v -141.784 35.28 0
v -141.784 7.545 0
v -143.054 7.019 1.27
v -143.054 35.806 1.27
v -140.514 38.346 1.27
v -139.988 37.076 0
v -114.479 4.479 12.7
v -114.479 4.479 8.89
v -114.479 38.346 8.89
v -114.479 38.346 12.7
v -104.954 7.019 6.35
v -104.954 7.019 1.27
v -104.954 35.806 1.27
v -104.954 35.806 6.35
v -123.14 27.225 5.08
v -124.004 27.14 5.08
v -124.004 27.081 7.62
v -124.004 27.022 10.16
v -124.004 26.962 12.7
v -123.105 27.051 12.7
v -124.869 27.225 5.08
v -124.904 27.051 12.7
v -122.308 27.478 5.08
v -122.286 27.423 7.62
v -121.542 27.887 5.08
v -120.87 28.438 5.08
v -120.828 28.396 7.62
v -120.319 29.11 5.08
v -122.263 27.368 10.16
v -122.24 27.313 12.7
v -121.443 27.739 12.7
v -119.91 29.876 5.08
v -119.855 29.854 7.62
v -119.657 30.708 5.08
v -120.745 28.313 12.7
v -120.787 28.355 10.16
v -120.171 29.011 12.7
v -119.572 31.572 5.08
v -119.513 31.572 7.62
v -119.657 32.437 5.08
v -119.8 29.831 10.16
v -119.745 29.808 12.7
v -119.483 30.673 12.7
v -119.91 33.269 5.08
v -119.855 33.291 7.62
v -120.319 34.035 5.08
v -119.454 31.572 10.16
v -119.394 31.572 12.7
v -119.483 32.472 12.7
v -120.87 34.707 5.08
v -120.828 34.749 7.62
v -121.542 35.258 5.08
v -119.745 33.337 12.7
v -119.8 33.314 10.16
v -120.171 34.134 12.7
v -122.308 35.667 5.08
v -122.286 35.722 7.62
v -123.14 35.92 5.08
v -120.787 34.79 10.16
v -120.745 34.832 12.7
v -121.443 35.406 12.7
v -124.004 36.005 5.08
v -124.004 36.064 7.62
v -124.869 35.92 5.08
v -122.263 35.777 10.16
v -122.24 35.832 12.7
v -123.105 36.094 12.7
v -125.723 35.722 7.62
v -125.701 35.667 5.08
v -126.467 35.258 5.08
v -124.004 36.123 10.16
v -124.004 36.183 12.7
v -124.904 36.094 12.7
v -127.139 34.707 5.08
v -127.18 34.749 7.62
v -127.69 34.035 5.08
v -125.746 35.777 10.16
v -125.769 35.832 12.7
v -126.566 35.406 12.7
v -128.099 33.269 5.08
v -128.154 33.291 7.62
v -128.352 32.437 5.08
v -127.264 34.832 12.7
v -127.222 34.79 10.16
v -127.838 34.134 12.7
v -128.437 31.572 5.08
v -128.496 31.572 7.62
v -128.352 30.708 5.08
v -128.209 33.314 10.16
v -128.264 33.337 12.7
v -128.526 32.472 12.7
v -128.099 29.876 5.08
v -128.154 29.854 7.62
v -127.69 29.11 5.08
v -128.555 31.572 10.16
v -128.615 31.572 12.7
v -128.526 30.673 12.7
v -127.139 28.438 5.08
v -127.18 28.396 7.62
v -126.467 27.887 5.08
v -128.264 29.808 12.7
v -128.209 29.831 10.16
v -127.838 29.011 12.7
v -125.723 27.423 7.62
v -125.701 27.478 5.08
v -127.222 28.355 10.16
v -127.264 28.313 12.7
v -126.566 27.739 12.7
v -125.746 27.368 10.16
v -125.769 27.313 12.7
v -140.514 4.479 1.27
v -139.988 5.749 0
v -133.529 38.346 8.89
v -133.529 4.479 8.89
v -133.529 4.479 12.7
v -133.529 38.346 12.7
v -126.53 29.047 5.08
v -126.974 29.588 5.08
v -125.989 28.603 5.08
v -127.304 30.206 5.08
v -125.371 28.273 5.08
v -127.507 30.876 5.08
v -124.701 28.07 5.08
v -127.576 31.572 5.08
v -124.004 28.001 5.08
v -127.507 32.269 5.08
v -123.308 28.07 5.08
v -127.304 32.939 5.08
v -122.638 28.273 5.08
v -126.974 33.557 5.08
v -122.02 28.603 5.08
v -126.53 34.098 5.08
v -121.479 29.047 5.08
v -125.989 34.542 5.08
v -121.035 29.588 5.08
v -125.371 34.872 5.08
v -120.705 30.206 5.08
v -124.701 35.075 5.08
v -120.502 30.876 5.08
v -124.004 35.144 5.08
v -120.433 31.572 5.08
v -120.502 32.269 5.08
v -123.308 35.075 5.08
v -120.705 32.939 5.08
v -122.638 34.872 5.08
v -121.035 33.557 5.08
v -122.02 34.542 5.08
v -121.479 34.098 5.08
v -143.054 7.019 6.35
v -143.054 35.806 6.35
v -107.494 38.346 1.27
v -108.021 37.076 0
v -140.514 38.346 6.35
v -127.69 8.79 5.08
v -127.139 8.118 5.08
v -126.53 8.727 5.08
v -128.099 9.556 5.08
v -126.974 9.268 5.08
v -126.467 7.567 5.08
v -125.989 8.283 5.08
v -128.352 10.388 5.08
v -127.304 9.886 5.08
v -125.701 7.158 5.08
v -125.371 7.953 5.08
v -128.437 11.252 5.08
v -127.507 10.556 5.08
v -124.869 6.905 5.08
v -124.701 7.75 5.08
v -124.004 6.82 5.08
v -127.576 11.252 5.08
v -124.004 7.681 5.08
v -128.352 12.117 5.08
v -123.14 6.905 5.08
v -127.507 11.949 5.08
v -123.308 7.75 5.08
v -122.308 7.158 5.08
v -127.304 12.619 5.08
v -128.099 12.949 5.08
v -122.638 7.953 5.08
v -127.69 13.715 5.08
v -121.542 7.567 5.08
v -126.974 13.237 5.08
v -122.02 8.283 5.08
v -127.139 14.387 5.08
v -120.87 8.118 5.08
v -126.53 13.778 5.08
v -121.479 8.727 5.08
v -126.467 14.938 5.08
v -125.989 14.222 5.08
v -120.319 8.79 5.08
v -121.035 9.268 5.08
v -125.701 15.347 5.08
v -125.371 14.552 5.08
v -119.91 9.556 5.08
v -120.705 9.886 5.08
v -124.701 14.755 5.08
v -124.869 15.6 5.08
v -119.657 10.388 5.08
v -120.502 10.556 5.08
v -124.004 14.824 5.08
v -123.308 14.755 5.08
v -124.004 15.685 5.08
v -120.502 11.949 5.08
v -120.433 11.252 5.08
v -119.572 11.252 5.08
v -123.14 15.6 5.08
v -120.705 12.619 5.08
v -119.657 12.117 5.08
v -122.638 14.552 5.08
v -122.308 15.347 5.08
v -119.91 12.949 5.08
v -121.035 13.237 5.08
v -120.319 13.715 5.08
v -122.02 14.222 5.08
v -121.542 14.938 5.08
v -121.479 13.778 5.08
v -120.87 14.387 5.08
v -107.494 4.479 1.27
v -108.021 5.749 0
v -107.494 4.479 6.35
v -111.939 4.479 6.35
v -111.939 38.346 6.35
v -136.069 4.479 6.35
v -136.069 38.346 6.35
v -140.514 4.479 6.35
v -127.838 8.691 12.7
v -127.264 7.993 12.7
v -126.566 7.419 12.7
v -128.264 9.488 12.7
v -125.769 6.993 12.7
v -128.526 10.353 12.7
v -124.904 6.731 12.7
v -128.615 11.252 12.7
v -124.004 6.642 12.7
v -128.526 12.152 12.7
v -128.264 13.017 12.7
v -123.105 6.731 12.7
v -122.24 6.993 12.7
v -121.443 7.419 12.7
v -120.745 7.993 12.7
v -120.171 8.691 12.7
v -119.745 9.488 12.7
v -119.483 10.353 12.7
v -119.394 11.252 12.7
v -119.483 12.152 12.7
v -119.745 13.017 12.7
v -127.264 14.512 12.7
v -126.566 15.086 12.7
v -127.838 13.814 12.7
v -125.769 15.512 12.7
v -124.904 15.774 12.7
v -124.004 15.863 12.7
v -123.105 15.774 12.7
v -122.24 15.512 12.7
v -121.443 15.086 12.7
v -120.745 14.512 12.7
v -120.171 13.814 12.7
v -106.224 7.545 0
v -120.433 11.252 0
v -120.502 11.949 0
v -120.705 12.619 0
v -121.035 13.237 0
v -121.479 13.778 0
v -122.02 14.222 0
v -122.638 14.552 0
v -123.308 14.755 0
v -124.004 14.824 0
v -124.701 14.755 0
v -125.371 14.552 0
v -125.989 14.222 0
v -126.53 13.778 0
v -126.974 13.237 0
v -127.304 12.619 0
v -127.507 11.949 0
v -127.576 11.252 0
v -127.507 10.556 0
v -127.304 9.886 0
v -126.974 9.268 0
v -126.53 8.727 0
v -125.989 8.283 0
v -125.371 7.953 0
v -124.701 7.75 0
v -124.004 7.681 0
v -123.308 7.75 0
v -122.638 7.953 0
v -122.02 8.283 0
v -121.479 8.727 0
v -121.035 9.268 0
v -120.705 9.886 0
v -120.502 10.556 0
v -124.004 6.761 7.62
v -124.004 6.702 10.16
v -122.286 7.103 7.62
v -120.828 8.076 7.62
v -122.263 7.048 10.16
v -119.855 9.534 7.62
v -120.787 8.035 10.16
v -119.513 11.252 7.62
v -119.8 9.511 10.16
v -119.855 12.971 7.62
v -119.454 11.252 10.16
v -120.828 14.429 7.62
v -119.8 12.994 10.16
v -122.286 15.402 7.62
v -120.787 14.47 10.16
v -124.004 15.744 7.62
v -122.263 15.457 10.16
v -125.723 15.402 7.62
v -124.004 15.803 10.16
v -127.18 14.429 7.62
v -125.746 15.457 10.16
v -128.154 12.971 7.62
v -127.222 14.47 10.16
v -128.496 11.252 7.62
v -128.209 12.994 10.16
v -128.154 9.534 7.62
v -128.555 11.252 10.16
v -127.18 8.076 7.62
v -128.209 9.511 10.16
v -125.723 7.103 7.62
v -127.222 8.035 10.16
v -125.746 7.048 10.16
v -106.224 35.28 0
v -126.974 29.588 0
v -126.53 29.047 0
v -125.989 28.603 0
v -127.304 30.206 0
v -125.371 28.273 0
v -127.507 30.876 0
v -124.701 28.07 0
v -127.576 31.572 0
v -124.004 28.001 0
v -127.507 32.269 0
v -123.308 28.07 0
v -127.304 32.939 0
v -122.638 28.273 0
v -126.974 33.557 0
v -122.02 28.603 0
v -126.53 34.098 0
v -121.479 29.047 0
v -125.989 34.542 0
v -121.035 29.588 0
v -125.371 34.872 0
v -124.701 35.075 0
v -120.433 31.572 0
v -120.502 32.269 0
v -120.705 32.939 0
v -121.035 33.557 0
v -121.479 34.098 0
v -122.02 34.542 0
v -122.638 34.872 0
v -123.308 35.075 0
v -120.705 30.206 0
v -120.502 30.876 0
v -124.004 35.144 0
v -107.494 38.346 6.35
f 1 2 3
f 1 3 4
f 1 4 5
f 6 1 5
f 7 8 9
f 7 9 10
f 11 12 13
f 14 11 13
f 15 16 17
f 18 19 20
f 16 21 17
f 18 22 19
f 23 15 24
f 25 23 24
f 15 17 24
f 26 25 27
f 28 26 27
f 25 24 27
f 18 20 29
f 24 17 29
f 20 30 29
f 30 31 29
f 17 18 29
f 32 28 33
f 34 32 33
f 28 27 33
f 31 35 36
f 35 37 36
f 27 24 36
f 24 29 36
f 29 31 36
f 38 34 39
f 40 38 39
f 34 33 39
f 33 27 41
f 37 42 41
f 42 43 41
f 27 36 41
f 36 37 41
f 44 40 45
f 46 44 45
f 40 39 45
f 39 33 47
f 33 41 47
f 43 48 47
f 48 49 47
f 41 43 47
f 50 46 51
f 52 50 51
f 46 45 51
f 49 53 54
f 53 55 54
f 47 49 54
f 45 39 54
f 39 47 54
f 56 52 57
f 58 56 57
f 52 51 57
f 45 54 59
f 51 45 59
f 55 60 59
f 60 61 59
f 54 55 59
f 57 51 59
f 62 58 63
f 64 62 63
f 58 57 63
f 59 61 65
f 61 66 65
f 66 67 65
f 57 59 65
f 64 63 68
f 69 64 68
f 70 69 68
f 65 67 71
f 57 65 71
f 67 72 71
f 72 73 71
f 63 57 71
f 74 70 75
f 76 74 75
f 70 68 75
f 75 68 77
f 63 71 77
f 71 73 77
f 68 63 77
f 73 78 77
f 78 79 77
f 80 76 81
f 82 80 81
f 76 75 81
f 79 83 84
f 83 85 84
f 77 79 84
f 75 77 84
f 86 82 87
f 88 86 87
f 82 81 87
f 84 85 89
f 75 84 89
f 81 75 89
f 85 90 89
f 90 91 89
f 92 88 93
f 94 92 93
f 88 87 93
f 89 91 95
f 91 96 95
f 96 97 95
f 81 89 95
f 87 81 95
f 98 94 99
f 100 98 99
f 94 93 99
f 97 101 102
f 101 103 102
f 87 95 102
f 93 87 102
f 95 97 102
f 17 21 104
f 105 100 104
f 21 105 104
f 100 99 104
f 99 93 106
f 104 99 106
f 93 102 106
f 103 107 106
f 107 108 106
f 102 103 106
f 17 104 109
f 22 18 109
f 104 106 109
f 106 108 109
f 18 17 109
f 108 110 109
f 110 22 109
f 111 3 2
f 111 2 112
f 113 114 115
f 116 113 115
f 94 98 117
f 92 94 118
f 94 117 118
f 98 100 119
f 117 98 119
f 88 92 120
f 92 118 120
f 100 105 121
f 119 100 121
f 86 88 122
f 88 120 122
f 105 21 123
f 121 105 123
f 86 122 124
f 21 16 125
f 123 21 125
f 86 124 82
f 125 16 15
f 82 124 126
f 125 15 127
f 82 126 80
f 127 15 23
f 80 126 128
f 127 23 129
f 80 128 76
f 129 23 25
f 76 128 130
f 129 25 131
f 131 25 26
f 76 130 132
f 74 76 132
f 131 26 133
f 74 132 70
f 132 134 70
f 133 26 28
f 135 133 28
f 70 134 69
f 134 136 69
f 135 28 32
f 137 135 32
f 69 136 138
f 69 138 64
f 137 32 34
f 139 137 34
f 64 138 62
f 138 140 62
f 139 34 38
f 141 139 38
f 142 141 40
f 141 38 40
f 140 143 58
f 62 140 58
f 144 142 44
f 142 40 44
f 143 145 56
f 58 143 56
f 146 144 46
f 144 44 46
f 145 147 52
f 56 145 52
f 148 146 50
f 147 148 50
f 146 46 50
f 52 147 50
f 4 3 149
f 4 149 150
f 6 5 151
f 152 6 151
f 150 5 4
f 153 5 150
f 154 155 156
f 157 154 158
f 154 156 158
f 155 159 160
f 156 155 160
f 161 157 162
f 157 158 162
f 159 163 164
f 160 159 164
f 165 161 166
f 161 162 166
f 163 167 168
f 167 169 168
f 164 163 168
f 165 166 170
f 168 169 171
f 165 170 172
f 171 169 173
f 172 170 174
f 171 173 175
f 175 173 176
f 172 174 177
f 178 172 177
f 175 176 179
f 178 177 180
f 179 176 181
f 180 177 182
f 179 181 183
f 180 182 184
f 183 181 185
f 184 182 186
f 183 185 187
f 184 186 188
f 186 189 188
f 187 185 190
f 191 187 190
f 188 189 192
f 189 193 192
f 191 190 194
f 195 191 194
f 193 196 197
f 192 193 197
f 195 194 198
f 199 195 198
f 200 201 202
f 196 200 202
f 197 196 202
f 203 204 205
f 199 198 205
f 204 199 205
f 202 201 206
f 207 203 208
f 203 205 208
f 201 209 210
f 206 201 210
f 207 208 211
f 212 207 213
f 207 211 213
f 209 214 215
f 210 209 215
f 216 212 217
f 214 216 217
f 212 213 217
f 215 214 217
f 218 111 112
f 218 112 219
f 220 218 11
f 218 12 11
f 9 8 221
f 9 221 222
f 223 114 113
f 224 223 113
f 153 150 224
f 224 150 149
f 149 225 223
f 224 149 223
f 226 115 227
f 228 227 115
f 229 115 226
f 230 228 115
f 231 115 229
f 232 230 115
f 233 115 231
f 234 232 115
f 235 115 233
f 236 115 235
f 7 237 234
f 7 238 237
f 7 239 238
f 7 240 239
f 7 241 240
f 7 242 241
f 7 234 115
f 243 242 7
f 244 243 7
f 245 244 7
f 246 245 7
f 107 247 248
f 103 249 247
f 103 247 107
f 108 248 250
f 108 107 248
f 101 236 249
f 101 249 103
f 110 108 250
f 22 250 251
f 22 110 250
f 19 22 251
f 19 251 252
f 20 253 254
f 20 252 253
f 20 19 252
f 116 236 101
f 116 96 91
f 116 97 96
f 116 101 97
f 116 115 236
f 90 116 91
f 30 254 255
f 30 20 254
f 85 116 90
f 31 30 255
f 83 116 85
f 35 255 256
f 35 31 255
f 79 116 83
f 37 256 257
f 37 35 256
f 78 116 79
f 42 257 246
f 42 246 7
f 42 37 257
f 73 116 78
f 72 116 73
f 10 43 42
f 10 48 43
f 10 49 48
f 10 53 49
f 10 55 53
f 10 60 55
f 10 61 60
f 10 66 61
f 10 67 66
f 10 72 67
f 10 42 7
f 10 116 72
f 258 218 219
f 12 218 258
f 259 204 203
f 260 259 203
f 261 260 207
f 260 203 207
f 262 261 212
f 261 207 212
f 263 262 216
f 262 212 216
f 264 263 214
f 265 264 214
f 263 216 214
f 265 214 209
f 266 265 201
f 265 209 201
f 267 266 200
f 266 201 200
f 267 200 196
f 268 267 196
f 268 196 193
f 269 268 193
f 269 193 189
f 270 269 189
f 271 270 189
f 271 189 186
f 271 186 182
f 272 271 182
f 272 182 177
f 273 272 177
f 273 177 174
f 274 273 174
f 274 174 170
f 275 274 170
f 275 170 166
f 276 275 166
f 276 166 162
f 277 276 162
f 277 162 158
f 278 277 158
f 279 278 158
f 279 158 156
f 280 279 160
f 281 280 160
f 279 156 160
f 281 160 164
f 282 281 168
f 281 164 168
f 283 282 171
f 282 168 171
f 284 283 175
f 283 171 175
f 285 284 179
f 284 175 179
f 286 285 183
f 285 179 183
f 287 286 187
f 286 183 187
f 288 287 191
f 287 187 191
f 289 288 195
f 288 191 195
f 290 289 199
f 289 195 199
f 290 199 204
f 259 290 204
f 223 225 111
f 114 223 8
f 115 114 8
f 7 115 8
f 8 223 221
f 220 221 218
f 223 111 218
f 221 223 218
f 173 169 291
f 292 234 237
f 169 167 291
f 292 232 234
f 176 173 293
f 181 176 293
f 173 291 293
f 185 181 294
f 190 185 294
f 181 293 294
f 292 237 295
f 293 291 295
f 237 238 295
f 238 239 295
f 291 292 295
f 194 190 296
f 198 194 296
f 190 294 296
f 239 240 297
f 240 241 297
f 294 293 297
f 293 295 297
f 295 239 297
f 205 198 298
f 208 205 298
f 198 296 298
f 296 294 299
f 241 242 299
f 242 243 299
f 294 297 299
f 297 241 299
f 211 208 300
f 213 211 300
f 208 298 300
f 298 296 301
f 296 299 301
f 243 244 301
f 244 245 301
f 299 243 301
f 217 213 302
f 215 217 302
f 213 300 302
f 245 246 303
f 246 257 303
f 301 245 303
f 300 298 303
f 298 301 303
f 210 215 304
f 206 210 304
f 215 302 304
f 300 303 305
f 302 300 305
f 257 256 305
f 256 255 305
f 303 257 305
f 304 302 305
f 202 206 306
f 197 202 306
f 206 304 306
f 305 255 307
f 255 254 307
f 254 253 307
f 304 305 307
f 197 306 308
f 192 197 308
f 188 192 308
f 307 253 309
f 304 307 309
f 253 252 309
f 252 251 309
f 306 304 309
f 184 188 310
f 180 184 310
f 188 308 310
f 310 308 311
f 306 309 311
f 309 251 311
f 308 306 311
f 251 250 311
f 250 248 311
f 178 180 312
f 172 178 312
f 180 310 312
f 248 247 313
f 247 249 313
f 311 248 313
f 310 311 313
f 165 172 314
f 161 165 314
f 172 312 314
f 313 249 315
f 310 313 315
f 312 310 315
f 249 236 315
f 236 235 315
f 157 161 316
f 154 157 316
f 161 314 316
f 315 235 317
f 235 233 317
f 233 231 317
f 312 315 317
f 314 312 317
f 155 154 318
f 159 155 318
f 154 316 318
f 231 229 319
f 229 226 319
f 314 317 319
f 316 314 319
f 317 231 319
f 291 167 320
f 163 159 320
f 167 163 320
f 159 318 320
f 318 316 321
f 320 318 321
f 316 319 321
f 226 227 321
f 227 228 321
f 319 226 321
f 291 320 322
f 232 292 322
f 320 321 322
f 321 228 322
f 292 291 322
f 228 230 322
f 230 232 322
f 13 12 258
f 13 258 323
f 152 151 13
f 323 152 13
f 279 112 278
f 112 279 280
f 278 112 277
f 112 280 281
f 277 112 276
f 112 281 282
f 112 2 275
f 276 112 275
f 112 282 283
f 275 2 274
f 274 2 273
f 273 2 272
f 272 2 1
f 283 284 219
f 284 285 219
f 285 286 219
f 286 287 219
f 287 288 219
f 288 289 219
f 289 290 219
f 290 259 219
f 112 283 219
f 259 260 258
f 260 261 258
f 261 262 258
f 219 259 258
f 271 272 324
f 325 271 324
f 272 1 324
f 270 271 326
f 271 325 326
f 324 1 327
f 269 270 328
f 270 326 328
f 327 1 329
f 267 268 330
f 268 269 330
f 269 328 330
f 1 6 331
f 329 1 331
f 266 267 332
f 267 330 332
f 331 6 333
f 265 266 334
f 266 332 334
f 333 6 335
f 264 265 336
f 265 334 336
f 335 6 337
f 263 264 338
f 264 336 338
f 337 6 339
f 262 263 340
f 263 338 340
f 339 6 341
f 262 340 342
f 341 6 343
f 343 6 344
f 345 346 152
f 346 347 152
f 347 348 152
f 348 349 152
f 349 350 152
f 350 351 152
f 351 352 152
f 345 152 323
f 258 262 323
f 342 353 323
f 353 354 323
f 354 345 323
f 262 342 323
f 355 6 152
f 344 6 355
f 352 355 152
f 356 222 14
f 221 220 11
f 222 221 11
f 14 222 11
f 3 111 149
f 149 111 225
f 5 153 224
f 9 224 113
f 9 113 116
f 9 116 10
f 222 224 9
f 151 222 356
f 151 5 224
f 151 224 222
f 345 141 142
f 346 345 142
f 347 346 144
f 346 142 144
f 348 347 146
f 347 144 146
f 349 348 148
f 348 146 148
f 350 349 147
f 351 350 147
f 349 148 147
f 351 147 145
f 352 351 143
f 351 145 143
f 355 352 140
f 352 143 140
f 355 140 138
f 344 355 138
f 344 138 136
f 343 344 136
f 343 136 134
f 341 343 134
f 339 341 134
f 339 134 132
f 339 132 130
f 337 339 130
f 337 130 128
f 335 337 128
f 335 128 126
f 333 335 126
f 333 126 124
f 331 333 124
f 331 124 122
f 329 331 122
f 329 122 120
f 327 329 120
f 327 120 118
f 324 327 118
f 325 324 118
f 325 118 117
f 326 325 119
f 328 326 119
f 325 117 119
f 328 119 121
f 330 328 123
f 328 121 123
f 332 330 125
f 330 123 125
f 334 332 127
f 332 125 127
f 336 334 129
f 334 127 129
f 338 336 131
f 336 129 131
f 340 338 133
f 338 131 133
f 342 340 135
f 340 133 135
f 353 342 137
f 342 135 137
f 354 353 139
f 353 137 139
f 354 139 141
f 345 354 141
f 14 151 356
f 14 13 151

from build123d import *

# Parameters (mm, degrees)
SKETCH1_W               = 38.1
SKETCH1_H               = 33.86758938
BOSS_EXTRUDE1_DEPTH     = 12.7
F_1_4_CLEARANCE_HOLE1_D = 7.14248
HOLE1_AT_2_COUNT        = 2
HOLE1_AT_2_PITCH        = 20.32
SKETCH9_W               = 9.525
SKETCH9_H               = 6.35
CUT_EXTRUDE1_DEPTH      = 34.86758938
CHAMFER1_SIZE           = 2.54
CHAMFER2_SIZE           = 1.27


with BuildPart() as part:
    # Sketch1 → Boss-Extrude1 (new body)
    with BuildSketch(Plane.XY):
        with Locations((-124.004465969, 21.4125)):
            Rectangle(SKETCH1_W, SKETCH1_H)
    extrude(amount=BOSS_EXTRUDE1_DEPTH)

    # 1/4 Clearance Hole1 (through all)
    with Locations(Plane(origin=(0, 0, 0), x_dir=(-1, 0, 0), z_dir=(0, 0, -1))):
        with Locations((124.004465969, 11.2525), (124.004465969, 31.5725)):
            Hole(F_1_4_CLEARANCE_HOLE1_D / 2)

    # Sketch8 → Hole1 (revolve, cut)
    with BuildSketch(Plane(origin=(-124.004465969, 11.2525, 12.7), x_dir=(0, -1, 0), z_dir=(1, 0, 0))):
        Polygon((0, 0), (0, 7.62), (4.4323, 7.62), (4.6101, 0), align=None)
    hole1 = revolve(axis=Axis((-124.004465969, 11.2525, -97.3), (0, 0, 1)), mode=Mode.SUBTRACT)

    # Hole1 at 2: Hole1 ×2
    with Locations(*[(0, i * HOLE1_AT_2_PITCH, 0) for i in range(1, HOLE1_AT_2_COUNT)]):
        add(hole1, mode=Mode.SUBTRACT)

    # Sketch9 → Cut-Extrude1 (cut, through all)
    with BuildSketch(Plane.XZ.offset(-4.47870531)):
        with Locations((-109.716965969, 9.525)):
            Rectangle(SKETCH9_W, SKETCH9_H)
        with Locations((-138.291965969, 9.525)):
            Rectangle(SKETCH9_W, SKETCH9_H)
    extrude(amount=-CUT_EXTRUDE1_DEPTH, mode=Mode.SUBTRACT)

    # Chamfer1
    chamfer1_edges = [part.edges().sort_by_distance(p)[0] for p in [
        (-143.054465969, 38.34629469, 3.175),
        (-104.954465969, 38.34629469, 3.175),
        (-104.954465969, 4.47870531, 3.175),
        (-143.054465969, 4.47870531, 3.175),
        (-114.479465969, 21.4125, 6.35),
        (-133.529465969, 21.4125, 6.35),
    ]]
    chamfer(chamfer1_edges, length=CHAMFER1_SIZE)

    # Chamfer2
    chamfer2_edges = [part.edges().sort_by_distance(p)[0] for p in [
        (-143.054465969, 21.4125, 0),
        (-124.004465969, 38.34629469, 0),
        (-104.954465969, 21.4125, 0),
        (-124.004465969, 4.47870531, 0),
        (-106.224465969, 5.74870531, 0),
        (-141.784465969, 5.74870531, 0),
        (-106.224465969, 37.07629469, 0),
        (-141.784465969, 37.07629469, 0),
    ]]
    chamfer(chamfer2_edges, length=CHAMFER2_SIZE)


solid = part.part
